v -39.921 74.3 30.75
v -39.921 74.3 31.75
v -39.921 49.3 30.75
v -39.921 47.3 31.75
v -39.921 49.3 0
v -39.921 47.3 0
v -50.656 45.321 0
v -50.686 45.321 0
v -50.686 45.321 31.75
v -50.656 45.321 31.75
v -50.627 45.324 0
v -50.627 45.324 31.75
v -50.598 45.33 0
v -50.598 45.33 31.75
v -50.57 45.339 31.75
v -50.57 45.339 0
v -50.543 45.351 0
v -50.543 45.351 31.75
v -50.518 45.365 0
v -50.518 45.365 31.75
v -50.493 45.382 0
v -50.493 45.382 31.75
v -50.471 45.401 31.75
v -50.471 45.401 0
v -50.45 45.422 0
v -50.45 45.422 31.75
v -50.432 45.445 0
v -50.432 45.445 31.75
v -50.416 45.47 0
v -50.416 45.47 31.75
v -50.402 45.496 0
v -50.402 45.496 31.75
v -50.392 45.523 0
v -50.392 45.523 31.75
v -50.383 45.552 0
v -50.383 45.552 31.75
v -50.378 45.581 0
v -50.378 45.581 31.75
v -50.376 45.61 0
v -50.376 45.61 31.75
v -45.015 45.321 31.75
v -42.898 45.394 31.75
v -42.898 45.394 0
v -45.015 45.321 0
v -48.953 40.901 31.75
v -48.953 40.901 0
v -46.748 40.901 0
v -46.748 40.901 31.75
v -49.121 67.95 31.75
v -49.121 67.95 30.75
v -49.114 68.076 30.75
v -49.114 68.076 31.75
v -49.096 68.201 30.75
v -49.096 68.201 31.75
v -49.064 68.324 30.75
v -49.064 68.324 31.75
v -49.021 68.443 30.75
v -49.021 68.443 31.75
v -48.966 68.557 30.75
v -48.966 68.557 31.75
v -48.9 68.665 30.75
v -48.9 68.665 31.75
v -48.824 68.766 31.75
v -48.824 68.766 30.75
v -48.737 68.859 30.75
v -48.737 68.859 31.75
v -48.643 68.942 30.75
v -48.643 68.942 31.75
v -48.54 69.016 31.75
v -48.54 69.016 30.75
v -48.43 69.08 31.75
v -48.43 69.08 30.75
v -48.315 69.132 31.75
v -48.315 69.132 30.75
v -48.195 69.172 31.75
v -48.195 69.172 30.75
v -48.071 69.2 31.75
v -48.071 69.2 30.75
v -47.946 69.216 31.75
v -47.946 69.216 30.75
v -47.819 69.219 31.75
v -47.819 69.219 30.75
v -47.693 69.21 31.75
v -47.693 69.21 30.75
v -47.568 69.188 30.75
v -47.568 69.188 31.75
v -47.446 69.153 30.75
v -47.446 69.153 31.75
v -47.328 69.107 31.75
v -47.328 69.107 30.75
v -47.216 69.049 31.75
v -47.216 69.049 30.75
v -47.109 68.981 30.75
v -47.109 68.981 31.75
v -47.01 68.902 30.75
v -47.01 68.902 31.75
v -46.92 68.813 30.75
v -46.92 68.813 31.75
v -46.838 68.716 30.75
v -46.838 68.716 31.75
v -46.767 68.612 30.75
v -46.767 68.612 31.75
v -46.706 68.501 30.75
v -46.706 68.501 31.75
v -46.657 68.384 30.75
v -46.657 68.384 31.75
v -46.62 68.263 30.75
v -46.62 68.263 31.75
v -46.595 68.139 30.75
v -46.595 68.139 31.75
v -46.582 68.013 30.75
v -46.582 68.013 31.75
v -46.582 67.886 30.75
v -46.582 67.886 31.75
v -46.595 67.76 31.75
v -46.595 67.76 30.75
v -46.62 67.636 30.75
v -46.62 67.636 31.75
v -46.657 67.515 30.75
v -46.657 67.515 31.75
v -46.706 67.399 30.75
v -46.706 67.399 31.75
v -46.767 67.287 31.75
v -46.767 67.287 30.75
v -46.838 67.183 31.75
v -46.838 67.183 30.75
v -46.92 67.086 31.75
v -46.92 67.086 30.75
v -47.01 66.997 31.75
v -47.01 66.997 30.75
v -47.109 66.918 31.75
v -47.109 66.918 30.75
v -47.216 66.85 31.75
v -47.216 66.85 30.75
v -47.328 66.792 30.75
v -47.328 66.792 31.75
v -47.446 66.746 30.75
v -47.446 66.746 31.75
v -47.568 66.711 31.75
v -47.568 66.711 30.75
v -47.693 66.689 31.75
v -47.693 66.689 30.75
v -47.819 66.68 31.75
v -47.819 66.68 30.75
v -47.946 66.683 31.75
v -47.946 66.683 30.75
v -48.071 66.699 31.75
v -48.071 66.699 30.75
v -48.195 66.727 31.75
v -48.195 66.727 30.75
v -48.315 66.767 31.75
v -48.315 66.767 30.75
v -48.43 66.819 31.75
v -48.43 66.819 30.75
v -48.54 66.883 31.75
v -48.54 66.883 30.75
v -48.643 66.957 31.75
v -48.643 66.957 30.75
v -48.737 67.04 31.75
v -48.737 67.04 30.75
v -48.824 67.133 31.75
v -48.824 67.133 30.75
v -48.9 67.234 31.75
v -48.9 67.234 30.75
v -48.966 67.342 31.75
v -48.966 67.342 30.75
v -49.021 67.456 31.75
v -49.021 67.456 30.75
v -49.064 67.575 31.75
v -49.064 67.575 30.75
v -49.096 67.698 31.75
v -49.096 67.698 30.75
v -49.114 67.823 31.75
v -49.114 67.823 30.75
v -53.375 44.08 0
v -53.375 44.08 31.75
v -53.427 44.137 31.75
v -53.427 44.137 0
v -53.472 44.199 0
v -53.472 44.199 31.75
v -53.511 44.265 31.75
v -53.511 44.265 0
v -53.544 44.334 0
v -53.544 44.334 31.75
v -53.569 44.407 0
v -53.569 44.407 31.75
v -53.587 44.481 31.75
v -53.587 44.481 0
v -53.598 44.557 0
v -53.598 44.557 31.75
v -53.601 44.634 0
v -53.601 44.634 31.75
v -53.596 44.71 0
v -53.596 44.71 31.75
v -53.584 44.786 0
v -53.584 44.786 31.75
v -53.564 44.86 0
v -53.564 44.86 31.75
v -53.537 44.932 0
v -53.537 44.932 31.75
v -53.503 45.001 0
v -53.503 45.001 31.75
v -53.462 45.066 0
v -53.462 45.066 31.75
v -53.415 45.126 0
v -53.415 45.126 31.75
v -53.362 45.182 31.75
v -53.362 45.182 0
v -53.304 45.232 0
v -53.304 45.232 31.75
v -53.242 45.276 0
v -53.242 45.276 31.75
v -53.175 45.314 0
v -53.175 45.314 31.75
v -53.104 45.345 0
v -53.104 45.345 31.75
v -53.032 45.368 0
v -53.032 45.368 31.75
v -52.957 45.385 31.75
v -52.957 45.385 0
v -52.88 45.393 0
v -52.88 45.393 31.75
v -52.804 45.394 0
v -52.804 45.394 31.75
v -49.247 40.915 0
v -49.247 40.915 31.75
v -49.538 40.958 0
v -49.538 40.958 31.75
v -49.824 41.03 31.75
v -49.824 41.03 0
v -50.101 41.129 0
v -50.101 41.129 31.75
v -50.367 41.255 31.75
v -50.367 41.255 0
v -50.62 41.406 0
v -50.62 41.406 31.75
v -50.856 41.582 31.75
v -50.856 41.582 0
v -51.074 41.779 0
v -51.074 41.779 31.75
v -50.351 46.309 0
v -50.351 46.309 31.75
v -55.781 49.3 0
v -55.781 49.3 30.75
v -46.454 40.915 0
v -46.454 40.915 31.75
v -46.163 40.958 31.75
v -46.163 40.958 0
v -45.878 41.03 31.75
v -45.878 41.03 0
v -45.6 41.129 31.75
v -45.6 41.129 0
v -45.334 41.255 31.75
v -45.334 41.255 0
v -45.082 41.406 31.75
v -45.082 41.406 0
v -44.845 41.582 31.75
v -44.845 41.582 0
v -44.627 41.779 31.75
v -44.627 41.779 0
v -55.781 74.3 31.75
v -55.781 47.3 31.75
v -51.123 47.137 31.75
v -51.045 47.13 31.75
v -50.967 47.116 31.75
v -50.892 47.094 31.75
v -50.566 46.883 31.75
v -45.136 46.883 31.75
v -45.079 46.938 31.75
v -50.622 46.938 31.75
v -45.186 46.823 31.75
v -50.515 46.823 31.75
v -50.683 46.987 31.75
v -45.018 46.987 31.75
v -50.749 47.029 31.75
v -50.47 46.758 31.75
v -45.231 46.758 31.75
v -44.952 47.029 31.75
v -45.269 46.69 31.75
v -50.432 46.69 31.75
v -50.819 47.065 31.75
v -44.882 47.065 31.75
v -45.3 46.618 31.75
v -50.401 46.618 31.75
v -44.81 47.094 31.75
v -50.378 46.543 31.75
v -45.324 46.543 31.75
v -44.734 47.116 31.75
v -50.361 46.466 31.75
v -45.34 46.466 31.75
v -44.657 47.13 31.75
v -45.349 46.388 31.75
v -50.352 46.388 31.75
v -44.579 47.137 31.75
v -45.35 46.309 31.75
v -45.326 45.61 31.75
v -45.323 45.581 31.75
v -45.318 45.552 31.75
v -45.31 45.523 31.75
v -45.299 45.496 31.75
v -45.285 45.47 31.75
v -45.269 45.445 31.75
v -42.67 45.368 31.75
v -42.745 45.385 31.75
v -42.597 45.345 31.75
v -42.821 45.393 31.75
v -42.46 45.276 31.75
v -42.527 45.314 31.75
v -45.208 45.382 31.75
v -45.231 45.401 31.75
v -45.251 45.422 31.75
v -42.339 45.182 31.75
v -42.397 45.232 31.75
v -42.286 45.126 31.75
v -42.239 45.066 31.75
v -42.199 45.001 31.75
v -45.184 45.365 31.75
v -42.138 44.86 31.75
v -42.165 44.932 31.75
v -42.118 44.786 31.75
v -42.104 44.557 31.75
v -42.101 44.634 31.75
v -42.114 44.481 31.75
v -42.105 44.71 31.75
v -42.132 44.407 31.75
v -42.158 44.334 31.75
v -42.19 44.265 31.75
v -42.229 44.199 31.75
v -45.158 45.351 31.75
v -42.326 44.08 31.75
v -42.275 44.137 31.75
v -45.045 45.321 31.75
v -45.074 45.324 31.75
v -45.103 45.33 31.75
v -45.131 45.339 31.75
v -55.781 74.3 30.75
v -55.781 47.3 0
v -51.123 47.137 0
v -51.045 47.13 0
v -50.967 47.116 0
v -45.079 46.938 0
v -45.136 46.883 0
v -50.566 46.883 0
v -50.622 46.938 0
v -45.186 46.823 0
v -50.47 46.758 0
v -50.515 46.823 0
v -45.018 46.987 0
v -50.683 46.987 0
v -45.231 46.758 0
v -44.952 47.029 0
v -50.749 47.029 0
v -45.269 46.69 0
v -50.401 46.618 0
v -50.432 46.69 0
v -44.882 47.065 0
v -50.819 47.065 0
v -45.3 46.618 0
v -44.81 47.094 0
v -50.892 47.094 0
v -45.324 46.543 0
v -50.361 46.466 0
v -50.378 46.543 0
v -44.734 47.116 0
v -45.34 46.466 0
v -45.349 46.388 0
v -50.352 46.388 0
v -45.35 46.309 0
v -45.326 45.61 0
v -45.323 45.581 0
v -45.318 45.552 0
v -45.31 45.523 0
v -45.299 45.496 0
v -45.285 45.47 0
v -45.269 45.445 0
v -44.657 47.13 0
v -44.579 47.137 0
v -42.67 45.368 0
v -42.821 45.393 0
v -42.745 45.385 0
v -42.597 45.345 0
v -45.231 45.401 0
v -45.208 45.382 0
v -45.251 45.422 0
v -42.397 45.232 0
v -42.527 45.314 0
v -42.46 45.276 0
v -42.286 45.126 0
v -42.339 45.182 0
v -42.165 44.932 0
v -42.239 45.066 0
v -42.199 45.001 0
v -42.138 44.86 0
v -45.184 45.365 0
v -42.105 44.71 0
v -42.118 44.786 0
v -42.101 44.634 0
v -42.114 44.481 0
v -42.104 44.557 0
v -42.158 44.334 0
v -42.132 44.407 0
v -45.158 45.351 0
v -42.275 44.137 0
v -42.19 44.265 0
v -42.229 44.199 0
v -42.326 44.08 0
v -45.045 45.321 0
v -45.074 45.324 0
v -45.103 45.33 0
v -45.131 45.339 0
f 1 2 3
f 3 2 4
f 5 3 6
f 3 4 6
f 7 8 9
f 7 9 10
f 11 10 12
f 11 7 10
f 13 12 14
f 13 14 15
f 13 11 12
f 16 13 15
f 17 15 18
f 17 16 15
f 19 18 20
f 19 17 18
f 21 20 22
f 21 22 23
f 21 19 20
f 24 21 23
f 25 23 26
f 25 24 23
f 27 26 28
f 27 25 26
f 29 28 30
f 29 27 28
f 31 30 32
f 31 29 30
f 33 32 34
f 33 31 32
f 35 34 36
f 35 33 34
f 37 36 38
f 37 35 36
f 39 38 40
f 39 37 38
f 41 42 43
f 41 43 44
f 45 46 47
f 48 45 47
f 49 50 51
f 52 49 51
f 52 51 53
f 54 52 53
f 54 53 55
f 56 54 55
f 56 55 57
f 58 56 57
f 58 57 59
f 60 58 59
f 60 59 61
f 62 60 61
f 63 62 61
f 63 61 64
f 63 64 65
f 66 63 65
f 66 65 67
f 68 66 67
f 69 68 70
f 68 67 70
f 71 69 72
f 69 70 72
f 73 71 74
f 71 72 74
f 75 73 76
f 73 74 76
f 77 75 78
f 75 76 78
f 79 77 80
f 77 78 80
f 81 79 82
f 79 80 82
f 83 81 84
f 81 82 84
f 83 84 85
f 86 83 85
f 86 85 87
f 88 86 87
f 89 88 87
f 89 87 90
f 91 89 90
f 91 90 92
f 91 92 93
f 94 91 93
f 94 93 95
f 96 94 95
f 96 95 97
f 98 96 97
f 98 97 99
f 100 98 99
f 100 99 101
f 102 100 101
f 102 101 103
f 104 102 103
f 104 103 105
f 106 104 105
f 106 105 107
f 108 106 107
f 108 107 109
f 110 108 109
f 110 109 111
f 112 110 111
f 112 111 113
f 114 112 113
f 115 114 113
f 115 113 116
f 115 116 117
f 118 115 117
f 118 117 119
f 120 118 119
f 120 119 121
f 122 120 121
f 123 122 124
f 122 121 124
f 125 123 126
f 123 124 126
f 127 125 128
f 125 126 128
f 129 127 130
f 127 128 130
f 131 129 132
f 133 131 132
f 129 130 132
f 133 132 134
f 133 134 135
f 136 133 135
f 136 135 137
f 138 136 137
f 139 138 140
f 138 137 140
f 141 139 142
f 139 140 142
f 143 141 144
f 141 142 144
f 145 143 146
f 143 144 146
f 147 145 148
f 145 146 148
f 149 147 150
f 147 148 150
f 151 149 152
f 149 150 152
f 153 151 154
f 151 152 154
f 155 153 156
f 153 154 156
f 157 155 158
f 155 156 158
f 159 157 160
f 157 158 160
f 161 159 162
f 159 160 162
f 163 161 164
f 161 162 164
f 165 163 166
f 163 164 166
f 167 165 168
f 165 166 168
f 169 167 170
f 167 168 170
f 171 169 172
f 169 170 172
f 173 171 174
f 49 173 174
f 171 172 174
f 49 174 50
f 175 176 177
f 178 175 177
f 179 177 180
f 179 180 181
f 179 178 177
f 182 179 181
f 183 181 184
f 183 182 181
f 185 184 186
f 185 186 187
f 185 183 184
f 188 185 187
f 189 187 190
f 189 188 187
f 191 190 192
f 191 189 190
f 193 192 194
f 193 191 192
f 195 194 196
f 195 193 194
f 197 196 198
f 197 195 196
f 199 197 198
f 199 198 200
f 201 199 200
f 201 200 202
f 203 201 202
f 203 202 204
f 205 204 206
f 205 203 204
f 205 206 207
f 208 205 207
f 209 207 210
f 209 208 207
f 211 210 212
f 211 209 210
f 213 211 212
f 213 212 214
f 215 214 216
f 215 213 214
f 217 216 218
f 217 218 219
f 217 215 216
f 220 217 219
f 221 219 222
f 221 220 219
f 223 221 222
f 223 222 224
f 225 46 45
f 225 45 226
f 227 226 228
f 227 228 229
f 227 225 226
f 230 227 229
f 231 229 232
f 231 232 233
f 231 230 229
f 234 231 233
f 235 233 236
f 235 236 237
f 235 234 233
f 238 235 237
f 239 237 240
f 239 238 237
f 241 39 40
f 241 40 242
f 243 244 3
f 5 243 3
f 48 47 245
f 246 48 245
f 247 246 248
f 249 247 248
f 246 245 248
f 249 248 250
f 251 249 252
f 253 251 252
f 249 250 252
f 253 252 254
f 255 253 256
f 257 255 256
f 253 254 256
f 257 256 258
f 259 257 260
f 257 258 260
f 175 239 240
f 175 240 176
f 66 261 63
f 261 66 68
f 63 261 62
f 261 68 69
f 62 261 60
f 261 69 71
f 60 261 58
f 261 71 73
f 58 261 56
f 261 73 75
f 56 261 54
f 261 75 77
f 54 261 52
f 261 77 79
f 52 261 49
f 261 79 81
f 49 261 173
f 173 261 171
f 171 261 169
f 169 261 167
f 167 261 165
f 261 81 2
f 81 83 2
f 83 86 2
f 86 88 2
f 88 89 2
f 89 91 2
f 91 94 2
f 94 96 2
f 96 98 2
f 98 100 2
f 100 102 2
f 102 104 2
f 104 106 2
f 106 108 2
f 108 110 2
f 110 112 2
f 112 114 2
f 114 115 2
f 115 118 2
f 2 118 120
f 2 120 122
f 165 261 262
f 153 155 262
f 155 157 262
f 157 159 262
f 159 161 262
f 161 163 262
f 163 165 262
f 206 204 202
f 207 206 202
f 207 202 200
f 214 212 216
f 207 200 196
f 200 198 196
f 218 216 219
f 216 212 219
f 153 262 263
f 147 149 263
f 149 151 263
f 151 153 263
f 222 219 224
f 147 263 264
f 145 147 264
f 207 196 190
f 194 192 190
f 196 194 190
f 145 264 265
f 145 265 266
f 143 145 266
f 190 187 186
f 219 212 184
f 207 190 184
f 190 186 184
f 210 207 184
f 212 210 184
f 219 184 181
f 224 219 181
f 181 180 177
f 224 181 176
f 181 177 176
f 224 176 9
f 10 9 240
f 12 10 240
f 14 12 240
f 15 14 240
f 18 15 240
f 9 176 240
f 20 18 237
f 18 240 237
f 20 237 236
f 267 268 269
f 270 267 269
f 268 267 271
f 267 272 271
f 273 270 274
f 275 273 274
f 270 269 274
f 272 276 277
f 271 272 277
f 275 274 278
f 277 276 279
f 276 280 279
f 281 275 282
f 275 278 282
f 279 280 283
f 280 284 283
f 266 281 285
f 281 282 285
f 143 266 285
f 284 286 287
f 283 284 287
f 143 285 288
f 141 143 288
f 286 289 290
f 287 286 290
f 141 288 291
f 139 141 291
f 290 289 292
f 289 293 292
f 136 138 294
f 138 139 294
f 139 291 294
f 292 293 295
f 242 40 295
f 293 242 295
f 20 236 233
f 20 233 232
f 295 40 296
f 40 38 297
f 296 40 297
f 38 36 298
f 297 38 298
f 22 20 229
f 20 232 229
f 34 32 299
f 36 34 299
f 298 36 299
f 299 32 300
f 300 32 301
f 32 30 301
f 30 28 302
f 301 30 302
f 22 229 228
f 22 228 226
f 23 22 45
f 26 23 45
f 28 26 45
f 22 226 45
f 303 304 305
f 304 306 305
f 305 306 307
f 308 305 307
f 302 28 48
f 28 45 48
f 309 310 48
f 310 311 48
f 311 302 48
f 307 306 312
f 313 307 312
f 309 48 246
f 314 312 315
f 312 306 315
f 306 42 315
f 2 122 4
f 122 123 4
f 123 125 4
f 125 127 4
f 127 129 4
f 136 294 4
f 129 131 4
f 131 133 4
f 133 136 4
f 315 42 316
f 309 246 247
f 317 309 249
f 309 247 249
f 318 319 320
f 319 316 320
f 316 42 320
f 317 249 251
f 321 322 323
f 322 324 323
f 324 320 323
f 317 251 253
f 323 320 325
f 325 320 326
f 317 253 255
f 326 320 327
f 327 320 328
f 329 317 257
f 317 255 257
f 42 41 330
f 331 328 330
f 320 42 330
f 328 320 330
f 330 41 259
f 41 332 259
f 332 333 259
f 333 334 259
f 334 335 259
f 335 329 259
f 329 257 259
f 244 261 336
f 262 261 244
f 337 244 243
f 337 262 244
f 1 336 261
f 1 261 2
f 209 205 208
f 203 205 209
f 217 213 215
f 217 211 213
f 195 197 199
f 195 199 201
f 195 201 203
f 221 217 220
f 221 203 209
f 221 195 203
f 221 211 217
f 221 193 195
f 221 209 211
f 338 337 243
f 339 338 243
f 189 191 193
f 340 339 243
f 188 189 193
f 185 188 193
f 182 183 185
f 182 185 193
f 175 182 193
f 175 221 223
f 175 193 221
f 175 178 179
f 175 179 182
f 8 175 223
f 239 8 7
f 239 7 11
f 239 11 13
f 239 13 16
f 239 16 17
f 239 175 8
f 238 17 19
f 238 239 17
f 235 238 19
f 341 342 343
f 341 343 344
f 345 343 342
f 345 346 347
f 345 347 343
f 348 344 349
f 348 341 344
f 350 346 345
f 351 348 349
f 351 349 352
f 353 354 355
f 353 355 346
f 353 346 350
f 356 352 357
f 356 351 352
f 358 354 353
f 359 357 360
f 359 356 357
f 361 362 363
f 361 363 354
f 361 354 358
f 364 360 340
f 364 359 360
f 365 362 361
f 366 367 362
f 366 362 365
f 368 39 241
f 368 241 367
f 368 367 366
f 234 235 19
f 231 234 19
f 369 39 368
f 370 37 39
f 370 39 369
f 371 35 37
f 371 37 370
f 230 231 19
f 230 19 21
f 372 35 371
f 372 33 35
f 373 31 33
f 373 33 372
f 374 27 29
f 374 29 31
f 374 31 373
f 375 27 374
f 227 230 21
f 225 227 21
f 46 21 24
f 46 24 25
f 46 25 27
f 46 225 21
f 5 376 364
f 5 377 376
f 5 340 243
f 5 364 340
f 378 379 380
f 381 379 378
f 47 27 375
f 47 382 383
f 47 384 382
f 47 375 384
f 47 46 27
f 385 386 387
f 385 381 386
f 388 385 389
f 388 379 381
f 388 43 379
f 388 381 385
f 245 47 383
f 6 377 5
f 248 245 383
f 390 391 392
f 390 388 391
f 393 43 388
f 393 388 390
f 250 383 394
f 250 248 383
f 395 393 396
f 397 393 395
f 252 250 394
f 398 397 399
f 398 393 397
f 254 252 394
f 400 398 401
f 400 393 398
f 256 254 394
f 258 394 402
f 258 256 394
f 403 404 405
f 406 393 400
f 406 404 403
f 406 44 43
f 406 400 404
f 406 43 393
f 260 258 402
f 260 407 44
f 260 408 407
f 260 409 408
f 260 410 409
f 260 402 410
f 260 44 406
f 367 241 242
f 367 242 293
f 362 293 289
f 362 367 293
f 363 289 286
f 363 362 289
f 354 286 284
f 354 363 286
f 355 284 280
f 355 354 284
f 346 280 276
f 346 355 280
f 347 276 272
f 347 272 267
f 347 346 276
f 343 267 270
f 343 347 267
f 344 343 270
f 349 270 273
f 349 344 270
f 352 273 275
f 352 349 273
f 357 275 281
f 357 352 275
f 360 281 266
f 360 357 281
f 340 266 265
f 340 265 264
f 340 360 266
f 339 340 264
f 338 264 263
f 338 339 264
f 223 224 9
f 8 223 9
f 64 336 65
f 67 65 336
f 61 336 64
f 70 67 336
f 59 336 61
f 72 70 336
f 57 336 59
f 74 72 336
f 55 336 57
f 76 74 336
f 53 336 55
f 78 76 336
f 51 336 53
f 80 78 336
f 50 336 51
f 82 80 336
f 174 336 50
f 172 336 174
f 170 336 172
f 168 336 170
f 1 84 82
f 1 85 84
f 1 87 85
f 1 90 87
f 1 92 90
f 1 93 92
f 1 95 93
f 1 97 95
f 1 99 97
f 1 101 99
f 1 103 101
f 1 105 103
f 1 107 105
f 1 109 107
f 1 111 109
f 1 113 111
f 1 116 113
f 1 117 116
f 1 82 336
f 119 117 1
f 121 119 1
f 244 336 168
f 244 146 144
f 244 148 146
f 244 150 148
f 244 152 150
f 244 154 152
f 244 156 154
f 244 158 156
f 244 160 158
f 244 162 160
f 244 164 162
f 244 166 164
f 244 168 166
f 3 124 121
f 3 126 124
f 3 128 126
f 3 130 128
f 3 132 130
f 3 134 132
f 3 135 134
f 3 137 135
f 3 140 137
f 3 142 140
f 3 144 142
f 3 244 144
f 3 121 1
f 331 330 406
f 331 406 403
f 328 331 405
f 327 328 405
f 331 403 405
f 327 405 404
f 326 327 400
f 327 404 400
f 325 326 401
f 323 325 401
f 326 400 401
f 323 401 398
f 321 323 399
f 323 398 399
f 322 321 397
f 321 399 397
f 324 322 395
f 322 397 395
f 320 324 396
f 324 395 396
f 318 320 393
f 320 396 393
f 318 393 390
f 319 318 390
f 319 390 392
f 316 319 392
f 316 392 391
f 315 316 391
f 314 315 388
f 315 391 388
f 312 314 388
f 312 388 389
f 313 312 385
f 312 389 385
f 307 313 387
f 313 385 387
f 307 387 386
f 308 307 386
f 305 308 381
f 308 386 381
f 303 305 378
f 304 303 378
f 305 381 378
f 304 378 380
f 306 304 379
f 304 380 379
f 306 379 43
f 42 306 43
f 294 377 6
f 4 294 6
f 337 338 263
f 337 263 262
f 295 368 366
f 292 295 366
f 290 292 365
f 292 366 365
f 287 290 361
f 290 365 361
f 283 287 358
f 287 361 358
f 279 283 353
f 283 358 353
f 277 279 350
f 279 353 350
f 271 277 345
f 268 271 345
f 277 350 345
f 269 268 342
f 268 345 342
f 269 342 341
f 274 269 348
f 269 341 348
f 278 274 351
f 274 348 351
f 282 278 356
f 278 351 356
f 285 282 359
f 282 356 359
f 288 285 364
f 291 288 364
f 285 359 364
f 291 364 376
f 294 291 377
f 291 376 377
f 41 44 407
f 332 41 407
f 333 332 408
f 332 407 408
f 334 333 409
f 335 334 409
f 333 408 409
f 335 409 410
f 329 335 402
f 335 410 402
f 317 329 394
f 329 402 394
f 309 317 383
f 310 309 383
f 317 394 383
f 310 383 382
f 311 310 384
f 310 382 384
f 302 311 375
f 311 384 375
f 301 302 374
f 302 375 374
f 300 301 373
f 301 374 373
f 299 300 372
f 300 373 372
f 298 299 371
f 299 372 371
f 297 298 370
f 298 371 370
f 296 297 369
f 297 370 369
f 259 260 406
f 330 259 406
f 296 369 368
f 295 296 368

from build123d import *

# Parameters (mm, degrees)
BOSS_EXTRUDE1_DEPTH = 31.75
SKETCH19_W          = 15.860402013
SKETCH19_H          = 31.75
BOSS_EXTRUDE7_DEPTH = 2
SKETCH23_W          = 15.860402013
SKETCH23_H          = 1
BOSS_EXTRUDE8_DEPTH = 25
SKETCH24_R          = 1.27
CUT_EXTRUDE1_DEPTH  = 2.54


with BuildPart() as part:
    # Sketch2 → Boss-Extrude1 (new body)
    with BuildSketch(Plane.XY):
        with BuildLine():
            Line((-50.375618534, 45.609862895), (-50.351188886, 46.309436474))
            ThreePointArc((-50.351188886, 46.309436474), (-50.565618587, 46.88295476), (-51.12278195, 47.136868733))
            Line((-51.12278195, 47.136868733), (-55.780902554, 47.299533889))
            Line((-55.780902554, 47.299533889), (-47.850701548, 47.299533889))
            Line((-47.850701548, 47.299533889), (-47.850701548, 40.900752235))
            Line((-47.850701548, 40.900752235), (-48.952946324, 40.900752235))
            ThreePointArc((-48.952946324, 40.900752235), (-50.100996621, 41.129113637), (-51.074266668, 41.779431891))
            Line((-51.074266668, 41.779431891), (-53.375146928, 44.080312152))
            ThreePointArc((-53.375146928, 44.080312152), (-53.536830204, 44.931922499), (-52.803734096, 45.394471696))
            Line((-52.803734096, 45.394471696), (-50.685905631, 45.320515496))
            ThreePointArc((-50.685905631, 45.320515496), (-50.470836274, 45.400926634), (-50.375618534, 45.609862895))
        make_face()
    boss_extrude1 = extrude(amount=BOSS_EXTRUDE1_DEPTH)

    # Mirror2: Boss-Extrude1 across plane
    add(boss_extrude1.mirror(Plane(origin=(-47.850701548, 40.900752235, 31.75), x_dir=(0, 0, 1), z_dir=(-1, 0, 0))))

    # Sketch19 → Boss-Extrude7 (add)
    with BuildSketch(Plane(origin=(0, 47.299533889, 0), x_dir=(1, 0, 0), z_dir=(0, 1, 0))):
        with Locations((-47.850701548, -15.875)):
            Rectangle(SKETCH19_W, SKETCH19_H)
    extrude(amount=BOSS_EXTRUDE7_DEPTH)

    # Sketch23 → Boss-Extrude8 (add)
    with BuildSketch(Plane(origin=(0, 49.299533889, 0), x_dir=(1, 0, 0), z_dir=(0, 1, 0))):
        with Locations((-47.850701548, -31.25)):
            Rectangle(SKETCH23_W, SKETCH23_H)
    extrude(amount=BOSS_EXTRUDE8_DEPTH)

    # Sketch24 → Cut-Extrude1 (cut)
    with BuildSketch(Plane(origin=(0, 0, 30.75), x_dir=(-1, 0, 0), z_dir=(0, 0, -1))):
        with Locations((47.850701548, 67.949533889)):
            Circle(SKETCH24_R)
    extrude(amount=-CUT_EXTRUDE1_DEPTH, mode=Mode.SUBTRACT)


solid = part.part
